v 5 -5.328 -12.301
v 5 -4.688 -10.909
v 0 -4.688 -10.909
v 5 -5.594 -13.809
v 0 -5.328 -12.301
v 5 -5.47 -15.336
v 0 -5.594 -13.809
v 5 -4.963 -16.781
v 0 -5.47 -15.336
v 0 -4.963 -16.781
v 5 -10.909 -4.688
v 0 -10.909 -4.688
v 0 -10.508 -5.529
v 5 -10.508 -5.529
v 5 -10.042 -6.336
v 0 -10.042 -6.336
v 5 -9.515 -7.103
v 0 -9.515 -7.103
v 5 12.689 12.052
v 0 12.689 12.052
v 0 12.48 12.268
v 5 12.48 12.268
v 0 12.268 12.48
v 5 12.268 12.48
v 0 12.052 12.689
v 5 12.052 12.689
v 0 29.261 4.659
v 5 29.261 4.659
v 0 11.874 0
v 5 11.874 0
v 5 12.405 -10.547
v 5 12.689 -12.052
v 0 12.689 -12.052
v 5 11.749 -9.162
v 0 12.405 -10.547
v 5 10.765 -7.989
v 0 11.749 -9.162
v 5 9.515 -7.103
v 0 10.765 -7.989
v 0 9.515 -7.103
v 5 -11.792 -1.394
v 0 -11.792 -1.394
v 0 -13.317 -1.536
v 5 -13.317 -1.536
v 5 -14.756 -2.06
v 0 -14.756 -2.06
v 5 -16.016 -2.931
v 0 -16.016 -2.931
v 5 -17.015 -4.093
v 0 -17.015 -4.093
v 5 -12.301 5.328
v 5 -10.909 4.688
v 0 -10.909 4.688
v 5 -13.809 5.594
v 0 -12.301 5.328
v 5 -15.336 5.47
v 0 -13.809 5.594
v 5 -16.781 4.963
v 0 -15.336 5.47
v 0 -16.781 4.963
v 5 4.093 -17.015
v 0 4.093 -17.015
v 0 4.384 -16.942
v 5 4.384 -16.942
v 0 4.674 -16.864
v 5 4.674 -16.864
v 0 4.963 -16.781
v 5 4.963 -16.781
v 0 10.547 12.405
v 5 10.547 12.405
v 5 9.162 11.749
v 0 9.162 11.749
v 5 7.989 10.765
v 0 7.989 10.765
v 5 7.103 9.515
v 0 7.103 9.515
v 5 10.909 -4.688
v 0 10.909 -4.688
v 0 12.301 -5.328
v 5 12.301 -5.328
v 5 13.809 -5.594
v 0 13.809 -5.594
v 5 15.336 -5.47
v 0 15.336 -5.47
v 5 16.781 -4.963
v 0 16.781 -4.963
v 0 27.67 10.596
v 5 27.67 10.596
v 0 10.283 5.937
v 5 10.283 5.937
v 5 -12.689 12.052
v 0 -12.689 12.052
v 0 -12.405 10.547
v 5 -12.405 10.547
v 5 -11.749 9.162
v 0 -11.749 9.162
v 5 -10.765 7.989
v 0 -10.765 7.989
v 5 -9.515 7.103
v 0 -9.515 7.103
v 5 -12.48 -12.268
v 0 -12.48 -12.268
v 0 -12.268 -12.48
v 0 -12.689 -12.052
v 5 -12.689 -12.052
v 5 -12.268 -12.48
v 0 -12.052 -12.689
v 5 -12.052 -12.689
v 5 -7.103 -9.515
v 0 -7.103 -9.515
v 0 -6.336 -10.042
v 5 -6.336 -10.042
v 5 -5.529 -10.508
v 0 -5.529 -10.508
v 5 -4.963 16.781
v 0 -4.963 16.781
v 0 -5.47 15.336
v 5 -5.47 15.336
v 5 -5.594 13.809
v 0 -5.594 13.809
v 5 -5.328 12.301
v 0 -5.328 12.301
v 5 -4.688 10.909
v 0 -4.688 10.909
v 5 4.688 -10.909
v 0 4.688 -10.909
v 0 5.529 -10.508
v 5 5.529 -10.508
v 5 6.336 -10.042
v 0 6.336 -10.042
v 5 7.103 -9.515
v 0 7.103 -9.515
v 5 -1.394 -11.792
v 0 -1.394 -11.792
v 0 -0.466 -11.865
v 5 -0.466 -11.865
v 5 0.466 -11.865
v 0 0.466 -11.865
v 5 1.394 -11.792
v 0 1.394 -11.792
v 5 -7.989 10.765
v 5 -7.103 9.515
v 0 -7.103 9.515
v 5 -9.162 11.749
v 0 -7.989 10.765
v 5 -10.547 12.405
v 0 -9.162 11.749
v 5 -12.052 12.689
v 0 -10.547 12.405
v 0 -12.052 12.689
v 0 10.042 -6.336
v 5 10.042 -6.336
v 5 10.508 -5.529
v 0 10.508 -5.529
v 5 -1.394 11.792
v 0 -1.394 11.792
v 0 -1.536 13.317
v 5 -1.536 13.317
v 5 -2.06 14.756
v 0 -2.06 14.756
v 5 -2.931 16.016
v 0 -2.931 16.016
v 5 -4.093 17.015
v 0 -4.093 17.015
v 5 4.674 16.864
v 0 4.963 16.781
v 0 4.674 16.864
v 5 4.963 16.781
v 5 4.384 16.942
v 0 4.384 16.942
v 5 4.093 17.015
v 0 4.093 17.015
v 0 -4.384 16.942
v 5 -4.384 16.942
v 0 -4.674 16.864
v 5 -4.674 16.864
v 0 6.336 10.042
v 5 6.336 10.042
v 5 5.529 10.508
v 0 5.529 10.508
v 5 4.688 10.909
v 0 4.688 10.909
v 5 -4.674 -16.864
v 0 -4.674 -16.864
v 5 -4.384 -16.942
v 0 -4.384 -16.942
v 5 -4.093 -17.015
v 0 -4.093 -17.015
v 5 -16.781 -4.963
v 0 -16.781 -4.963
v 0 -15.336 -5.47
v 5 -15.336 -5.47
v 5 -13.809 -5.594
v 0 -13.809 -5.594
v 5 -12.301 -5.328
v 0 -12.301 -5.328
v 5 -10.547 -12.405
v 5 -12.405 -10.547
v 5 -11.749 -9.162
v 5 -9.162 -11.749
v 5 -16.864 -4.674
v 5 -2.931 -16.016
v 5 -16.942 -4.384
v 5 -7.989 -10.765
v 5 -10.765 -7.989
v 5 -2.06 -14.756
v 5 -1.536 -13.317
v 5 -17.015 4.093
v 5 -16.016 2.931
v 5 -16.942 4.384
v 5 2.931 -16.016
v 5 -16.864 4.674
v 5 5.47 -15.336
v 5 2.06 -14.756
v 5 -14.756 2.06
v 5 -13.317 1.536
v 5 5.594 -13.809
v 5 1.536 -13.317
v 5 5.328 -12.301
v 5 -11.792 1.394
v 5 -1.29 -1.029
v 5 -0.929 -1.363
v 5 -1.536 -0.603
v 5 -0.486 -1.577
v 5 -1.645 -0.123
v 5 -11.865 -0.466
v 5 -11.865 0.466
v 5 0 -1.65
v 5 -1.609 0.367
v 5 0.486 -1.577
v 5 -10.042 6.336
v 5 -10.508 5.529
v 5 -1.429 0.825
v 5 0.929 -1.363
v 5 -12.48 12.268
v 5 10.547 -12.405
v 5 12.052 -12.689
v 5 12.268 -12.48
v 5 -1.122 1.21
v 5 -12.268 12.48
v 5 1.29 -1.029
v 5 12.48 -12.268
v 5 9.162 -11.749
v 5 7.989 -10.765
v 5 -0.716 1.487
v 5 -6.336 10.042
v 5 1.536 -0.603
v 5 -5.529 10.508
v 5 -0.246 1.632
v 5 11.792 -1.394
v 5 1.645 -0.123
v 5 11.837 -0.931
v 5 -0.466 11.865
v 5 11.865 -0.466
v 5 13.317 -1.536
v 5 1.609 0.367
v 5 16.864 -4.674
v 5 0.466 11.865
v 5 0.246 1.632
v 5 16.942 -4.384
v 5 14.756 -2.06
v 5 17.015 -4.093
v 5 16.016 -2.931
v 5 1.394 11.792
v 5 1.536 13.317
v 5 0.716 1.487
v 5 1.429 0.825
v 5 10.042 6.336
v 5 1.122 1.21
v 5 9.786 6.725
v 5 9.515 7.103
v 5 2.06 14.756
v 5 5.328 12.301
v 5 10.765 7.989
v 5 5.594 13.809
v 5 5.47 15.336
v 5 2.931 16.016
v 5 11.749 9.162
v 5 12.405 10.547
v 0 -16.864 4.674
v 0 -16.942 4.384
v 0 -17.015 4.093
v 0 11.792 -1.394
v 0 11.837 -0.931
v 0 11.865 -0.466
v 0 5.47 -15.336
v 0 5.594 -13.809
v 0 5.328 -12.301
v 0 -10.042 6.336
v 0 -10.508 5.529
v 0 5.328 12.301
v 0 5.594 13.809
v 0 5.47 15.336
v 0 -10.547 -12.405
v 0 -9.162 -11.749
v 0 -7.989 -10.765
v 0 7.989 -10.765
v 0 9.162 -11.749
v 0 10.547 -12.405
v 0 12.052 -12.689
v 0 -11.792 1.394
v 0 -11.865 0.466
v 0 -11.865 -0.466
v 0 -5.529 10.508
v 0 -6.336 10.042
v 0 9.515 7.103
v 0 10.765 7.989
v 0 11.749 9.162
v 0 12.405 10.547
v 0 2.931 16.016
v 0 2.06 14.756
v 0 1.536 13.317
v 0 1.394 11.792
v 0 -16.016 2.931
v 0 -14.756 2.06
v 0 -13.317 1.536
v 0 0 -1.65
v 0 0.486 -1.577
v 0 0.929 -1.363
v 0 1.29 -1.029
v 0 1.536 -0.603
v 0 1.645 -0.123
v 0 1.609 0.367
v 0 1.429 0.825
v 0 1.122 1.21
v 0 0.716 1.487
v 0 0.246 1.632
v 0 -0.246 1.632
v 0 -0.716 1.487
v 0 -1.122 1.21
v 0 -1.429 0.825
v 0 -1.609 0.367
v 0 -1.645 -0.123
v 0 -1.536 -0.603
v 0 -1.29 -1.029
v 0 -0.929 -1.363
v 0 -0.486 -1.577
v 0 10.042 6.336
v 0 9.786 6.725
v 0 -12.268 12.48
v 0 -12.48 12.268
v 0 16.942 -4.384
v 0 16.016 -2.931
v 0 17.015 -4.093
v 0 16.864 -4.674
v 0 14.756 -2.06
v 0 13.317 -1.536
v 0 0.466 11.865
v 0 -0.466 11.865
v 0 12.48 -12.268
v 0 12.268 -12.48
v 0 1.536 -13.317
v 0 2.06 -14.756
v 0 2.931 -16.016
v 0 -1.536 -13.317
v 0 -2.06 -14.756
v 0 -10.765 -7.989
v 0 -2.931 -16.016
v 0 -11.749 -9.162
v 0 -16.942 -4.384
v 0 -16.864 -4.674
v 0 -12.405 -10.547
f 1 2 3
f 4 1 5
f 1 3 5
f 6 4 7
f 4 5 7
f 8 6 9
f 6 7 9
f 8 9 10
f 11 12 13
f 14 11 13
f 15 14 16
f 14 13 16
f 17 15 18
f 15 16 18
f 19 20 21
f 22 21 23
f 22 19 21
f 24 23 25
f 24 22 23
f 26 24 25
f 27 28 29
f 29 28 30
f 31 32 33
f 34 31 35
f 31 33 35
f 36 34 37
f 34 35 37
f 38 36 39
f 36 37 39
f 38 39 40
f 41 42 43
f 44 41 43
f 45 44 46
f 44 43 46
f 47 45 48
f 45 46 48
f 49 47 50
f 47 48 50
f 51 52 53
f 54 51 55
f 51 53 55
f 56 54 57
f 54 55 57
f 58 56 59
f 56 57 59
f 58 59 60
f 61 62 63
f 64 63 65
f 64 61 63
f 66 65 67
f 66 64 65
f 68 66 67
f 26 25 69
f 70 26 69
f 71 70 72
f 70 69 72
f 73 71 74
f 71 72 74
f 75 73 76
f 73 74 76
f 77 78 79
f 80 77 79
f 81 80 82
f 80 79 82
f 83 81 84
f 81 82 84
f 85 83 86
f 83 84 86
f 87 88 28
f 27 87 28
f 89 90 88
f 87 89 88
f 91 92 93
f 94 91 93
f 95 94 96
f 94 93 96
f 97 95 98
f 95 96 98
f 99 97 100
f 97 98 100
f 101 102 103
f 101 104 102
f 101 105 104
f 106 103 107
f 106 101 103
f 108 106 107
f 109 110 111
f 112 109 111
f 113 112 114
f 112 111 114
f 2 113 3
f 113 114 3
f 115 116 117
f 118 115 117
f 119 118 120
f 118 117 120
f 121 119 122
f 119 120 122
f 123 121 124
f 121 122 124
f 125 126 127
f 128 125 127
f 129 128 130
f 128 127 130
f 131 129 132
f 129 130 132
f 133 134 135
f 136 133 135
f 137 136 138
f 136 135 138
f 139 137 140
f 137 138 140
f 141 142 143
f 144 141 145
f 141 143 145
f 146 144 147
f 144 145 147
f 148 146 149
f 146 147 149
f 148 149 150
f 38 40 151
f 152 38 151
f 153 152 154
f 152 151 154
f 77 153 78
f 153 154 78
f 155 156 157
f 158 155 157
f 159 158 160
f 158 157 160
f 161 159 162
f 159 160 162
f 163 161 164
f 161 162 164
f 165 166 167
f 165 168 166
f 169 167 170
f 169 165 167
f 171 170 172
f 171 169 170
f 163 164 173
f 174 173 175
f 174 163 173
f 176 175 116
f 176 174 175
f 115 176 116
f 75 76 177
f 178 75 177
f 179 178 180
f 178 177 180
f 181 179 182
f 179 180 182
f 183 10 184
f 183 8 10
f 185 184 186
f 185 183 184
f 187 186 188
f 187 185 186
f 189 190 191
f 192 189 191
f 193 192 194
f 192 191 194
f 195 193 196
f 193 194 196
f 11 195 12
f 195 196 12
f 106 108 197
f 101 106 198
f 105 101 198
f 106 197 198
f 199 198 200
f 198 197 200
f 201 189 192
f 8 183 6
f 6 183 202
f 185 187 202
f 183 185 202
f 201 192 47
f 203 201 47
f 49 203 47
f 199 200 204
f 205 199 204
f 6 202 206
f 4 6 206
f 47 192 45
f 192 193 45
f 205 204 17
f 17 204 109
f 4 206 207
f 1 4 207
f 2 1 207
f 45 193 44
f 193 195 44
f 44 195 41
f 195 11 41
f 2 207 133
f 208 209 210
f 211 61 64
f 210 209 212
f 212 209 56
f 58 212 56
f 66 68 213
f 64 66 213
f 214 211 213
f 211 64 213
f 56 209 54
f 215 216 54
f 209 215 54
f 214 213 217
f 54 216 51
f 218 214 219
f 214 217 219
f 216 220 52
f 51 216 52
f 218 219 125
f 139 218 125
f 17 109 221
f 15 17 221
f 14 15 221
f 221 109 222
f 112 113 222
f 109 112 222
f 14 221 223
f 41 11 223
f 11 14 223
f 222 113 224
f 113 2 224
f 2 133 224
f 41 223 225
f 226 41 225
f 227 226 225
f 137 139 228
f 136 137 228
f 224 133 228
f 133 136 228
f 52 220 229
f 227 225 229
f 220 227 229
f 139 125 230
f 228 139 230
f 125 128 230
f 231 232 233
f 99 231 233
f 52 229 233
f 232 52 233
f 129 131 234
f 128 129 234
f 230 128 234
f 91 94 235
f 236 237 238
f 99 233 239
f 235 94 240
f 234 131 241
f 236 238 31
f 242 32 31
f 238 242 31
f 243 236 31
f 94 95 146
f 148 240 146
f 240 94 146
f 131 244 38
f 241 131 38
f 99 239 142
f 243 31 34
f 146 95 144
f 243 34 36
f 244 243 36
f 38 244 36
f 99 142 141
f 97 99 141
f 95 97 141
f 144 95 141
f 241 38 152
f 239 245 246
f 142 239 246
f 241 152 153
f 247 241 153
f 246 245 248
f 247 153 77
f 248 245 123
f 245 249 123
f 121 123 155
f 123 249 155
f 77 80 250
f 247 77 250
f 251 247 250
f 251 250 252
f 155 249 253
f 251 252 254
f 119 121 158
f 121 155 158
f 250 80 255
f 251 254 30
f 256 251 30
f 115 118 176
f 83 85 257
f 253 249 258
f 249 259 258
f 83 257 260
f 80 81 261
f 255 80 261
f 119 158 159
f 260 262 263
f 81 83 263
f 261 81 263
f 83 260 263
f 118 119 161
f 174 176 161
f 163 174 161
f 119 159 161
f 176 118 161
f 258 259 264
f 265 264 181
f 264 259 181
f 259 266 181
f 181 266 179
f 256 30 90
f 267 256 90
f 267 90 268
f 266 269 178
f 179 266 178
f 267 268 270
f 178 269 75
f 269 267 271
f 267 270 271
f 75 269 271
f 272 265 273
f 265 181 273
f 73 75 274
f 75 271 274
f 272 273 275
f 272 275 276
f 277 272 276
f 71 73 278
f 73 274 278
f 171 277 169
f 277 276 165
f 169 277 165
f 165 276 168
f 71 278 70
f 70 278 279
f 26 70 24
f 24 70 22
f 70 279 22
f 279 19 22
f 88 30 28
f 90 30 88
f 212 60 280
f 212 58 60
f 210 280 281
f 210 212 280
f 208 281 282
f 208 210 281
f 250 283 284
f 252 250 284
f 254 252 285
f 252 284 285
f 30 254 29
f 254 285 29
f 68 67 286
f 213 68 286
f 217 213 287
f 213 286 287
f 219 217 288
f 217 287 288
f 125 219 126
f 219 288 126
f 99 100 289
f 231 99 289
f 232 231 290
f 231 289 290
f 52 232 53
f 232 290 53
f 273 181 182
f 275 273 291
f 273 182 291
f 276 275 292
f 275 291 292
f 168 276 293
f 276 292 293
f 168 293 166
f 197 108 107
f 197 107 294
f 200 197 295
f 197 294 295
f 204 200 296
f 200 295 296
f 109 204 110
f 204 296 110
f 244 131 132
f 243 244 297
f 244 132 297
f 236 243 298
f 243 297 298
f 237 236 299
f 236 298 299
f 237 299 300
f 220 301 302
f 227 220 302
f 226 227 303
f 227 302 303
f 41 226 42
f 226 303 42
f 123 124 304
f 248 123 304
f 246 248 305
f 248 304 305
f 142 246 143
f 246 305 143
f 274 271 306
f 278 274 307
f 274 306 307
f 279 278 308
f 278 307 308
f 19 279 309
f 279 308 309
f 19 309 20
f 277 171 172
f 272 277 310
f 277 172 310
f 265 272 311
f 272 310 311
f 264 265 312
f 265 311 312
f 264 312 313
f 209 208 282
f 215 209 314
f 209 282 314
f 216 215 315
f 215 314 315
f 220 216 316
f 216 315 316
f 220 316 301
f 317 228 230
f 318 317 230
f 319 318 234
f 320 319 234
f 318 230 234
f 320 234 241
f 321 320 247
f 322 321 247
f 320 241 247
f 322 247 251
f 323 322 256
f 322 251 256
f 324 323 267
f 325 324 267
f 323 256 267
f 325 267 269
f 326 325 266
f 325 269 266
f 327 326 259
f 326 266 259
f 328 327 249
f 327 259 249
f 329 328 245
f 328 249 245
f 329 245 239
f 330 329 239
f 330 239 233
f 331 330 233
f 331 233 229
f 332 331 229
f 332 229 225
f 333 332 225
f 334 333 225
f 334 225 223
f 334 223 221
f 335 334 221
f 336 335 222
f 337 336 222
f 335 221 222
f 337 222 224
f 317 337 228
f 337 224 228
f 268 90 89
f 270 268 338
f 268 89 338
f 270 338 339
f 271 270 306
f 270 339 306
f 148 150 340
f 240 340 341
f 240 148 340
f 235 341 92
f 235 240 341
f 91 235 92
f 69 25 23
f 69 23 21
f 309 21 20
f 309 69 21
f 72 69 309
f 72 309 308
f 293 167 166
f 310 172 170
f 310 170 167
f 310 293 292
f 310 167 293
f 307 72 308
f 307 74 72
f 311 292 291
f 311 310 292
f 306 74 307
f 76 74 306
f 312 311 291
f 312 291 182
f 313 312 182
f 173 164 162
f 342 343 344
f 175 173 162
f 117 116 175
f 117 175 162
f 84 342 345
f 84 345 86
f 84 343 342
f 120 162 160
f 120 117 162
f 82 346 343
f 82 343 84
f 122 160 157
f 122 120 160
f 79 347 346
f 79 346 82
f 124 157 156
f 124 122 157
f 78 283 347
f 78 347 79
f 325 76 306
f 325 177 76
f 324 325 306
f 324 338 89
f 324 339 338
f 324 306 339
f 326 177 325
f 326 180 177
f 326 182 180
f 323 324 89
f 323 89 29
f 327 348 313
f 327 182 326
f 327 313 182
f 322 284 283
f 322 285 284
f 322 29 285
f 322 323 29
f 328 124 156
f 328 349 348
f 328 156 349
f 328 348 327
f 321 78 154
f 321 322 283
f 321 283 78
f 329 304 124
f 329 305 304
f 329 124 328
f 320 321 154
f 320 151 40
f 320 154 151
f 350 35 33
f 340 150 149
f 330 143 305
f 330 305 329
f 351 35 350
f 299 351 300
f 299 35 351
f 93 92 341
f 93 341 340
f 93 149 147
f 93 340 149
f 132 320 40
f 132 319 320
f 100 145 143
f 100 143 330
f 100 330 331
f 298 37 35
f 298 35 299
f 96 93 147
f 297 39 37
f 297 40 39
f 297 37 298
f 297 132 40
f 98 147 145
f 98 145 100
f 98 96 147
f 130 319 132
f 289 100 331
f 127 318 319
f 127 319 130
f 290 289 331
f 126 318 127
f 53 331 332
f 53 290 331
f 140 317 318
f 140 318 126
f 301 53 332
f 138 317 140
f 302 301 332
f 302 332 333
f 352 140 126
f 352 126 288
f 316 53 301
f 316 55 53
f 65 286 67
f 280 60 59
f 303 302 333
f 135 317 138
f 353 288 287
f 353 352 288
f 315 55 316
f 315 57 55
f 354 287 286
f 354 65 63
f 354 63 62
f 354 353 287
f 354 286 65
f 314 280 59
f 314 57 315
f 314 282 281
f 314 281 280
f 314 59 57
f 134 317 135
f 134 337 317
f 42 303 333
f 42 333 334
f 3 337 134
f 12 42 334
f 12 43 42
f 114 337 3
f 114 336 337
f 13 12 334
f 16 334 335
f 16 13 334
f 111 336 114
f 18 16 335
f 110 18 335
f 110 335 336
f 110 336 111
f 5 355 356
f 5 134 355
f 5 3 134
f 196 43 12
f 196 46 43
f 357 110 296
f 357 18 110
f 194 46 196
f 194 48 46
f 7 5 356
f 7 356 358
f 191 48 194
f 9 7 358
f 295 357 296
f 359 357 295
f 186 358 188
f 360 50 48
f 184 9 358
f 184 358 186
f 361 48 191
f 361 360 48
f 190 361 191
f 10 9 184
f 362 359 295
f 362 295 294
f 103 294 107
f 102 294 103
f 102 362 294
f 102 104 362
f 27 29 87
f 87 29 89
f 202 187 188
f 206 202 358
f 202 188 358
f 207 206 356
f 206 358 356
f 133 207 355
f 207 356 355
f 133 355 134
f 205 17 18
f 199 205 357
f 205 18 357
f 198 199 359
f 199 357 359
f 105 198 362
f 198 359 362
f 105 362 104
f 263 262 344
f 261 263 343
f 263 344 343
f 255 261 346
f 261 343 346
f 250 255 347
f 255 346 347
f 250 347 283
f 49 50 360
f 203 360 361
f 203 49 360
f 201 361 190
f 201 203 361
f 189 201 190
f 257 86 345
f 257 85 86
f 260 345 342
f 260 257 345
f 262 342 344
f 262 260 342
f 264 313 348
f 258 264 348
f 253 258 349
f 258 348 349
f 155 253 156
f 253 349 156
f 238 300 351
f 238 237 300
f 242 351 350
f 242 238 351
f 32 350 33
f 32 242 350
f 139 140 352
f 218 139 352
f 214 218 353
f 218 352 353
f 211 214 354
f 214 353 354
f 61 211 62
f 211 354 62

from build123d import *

# Parameters (mm, degrees)
BASPROSKE_W     = 5
BASPROSKE_H     = 17.5
TOOTHCUT_DEPTH  = 26.248762346
TEETHCUTS_COUNT = 12
TEETHCUTS_ANGLE = 330
BORSKE_R        = 4
BORE_DEPTH      = 50.0000508
EXTRUDE_1_DEPTH = 5
SKETCH_3_R      = 5.787483523
SKETCH_3_R_2    = 1.65
EXTRUDE_2_DEPTH = 5


with BuildPart() as part:
    # BasProSke → Base-Revolve (revolve)
    with BuildSketch(Plane(origin=(0, 0, 0), x_dir=(1, 0, 0), z_dir=(0, 1, 0)), mode=Mode.PRIVATE) as base_revolve_sk:
        with Locations((2.5, 8.75)):
            Rectangle(BASPROSKE_W, BASPROSKE_H)
    revolve(base_revolve_sk.sketch.rotate(Axis((-10, 0, 0), (1, 0, 0)), 180), axis=Axis((-10, 0, 0), (1, 0, 0)))

    # TooCutSke → ToothCut (cut, through all)
    with BuildSketch(Plane(origin=(0, 0, 0), x_dir=(0, 0, -1), z_dir=(1, 0, 0))):
        with BuildLine():
            ThreePointArc((1.394381134, 11.791843675), (0, 11.874), (-1.394381134, 11.791843675))
            ThreePointArc((-1.394381134, 11.791843675), (-2.068078374, 14.771857381), (-4.121860996, 17.033787221))
            ThreePointArc((-4.121860996, 17.033787221), (0, 17.5254), (4.121860996, 17.033787221))
            ThreePointArc((4.121860996, 17.033787221), (2.068078374, 14.771857381), (1.394381134, 11.791843675))
        make_face()
    toothcut = extrude(amount=TOOTHCUT_DEPTH, mode=Mode.SUBTRACT)

    # TeethCuts: ToothCut ×12 about axis
    teethcuts_axis = Axis((-10, 0, 0), (1, 0, 0))
    for i in range(1, TEETHCUTS_COUNT):
        add(toothcut.rotate(teethcuts_axis, i * TEETHCUTS_ANGLE / (TEETHCUTS_COUNT - 1)), mode=Mode.SUBTRACT)

    # BorSke → Bore (cut, symmetric)
    with BuildSketch(Plane(origin=(0, 0, 0), x_dir=(0, 0, -1), z_dir=(1, 0, 0))):
        with Locations(Location((0, 0, 0), (0, 0, 180))):
            Circle(BORSKE_R)
    extrude(amount=BORE_DEPTH, both=True, mode=Mode.SUBTRACT)

    # 草图2 → 凸台-拉伸1 (add)
    with BuildSketch(Plane(origin=(5, 0, 0), x_dir=(0, 0, -1), z_dir=(1, 0, 0))):
        Polygon((0, 11.874), (-5.937, 10.283185645), (-10.595742812, 27.669850518), (-4.658742812, 29.260664873), align=None)
    extrude(amount=-EXTRUDE_1_DEPTH)

    # 草图3 → 凸台-拉伸2 (add)
    with BuildSketch(Plane(origin=(5, 0, 0), x_dir=(0, 0, -1), z_dir=(1, 0, 0))):
        Circle(SKETCH_3_R)
        Circle(SKETCH_3_R_2, mode=Mode.SUBTRACT)
    extrude(amount=-EXTRUDE_2_DEPTH)


solid = part.part
